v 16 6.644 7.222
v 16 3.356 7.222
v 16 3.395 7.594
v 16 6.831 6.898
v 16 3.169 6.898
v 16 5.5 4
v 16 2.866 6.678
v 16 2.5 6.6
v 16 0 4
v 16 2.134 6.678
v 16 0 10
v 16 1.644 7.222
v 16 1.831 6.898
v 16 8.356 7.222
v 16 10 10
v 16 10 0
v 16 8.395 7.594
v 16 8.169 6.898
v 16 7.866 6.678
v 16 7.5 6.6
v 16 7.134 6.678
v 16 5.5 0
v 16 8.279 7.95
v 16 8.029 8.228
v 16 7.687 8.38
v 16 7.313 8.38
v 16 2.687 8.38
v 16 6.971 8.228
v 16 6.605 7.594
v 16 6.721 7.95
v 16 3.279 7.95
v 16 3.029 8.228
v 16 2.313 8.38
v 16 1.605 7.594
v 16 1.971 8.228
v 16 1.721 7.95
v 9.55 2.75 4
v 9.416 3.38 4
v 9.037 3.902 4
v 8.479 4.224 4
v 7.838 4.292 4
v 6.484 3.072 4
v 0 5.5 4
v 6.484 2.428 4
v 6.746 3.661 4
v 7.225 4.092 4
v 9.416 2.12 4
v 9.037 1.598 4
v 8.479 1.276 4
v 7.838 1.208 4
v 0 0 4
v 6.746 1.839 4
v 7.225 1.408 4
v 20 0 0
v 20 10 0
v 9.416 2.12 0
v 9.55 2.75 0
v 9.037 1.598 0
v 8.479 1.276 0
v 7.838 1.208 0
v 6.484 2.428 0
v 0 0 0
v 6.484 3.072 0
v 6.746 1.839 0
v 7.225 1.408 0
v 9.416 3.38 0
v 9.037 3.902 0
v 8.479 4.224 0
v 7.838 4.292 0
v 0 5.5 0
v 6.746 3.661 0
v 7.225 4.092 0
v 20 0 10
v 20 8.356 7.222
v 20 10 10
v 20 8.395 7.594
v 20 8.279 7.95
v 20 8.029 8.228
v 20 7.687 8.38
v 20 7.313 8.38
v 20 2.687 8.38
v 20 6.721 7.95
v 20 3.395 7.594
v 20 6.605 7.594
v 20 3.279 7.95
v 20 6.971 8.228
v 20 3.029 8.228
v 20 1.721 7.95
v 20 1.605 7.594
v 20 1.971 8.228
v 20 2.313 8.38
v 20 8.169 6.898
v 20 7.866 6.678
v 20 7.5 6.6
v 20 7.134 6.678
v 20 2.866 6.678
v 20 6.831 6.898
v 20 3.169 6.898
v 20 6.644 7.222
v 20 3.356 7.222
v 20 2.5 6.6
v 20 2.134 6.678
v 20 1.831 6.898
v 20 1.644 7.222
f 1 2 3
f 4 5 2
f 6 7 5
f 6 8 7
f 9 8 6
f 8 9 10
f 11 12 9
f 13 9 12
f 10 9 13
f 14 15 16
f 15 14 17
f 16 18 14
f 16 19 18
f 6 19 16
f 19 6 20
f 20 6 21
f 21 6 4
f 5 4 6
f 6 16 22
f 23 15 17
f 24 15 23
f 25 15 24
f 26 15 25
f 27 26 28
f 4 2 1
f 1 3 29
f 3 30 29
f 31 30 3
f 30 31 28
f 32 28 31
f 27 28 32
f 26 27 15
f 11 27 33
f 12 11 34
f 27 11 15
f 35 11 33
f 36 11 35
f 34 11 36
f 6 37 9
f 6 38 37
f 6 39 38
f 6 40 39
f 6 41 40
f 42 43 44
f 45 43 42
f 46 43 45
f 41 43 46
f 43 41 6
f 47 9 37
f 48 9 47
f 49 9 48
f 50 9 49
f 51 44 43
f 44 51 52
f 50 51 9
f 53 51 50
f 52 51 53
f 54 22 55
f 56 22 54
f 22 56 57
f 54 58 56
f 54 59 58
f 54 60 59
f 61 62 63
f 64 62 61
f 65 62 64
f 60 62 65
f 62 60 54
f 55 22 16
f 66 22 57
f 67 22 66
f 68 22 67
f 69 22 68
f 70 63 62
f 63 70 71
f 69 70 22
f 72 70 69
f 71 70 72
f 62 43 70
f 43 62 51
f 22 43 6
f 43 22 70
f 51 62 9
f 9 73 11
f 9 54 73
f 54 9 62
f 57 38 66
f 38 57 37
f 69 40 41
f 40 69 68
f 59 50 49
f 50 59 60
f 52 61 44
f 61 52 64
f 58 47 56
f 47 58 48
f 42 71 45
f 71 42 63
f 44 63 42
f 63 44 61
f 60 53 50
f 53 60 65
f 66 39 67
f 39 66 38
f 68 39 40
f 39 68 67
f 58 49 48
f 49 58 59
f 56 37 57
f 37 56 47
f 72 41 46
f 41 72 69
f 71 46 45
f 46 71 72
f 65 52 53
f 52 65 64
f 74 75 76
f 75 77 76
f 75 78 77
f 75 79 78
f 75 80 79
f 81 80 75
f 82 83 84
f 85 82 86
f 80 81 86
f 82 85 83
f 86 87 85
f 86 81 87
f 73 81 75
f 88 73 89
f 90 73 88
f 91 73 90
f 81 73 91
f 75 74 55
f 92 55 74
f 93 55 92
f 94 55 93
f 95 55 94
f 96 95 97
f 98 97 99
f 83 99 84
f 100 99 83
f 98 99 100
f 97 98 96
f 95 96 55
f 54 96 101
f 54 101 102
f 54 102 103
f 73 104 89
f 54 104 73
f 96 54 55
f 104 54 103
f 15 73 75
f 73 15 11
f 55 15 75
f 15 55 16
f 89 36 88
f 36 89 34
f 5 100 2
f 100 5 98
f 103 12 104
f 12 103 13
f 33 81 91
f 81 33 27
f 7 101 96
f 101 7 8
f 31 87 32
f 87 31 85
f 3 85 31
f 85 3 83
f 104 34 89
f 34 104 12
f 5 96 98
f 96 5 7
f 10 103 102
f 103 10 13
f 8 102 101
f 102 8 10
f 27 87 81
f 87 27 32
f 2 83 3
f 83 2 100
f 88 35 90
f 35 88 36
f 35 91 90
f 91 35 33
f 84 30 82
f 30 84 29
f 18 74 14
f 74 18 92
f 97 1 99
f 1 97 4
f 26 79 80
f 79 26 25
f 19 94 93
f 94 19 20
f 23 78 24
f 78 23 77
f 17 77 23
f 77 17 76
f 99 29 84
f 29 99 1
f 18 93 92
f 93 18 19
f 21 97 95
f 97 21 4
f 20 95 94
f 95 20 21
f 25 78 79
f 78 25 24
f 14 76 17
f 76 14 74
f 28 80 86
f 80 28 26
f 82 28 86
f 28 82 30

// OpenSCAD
WallThickness = 4;

BaseWidth = 16;
BaseDepth = 5.5;
BaseHoleDiameter = 3.1;

BaseToFlagDistance = 6+WallThickness;
BaseToFlagWidth = 10;

AdjustHoleInsideDiameter = 1.8;


difference() {
    cube(size=[BaseWidth, BaseDepth, WallThickness], center=false);
    translate([BaseWidth/2, BaseDepth/2, 0])
    cylinder(h=WallThickness, d=BaseHoleDiameter, center=false, $fn=15);
}

translate([BaseToFlagDistance+WallThickness/2*3, 0, 0])
difference() {
    cube(size=[WallThickness, BaseToFlagWidth, BaseToFlagDistance], center=false);
    translate([0, BaseToFlagWidth/4, BaseToFlagDistance/4*3])
    rotate([0, 90, 0])
    cylinder(h=WallThickness, d=AdjustHoleInsideDiameter, center=false, $fn=15);
    translate([0, BaseToFlagWidth/4*3, BaseToFlagDistance/4*3])
    rotate([0, 90, 0])
    cylinder(h=WallThickness, d=AdjustHoleInsideDiameter, center=false, $fn=15);
}


/*
WallThickness = 1.5;
BaseHeight = 123+WallThickness*2;
BaseWidth = 101+WallThickness*2;
BaseDepth = 30;
CornerRadius = 3;

LCDWidth = 80.5;
LCDHeight = 50.5;
LCDTopOffset = 9+WallThickness;
LCDLeftOffset = 9+WallThickness;

ResetButtonDiameter = 6;
ResetButtonBottomOffet = 8.5+WallThickness;
ResetButtonLeftOffet = 70.5+WallThickness;

RotaryEncoderDiameter = 8;
RotaryEncoderBottomOffet = 19+WallThickness;
RotaryEncoderLeftOffet = 87.5+WallThickness;

CardButtonDiameter = 6;
CardButtonBottomOffet = 44.5+WallThickness;
CardButtonLeftOffet = 78.5+WallThickness;

TFCardHeight = 2;
TFCardWidth = 14;
TFCardBottomOffset = 15+WallThickness;
TFCardFrontOffset = 19+WallThickness;

MountingHoleDiameter = 5.5;

module RoundedRectangle($Width=BaseWidth, $Depth=BaseDepth, $Radius=CornerRadius) 
{
    polygon(points = [[$Radius, 0], [$Width-$Radius, 0],[$Width, $Radius], [$Width, $Depth-$Radius], [$Width-$Radius, $Depth], [$Radius, $Depth], [0, $Depth-$Radius], [0, $Radius]], paths=[[0,1,2,3,4,5,6,7]]);
        
    translate([$Radius,$Radius,0]){
        circle(r=$Radius);
    }        
    translate([$Width-$Radius,$Radius,0]){
        circle(r=$Radius);
    }
    
    translate([$Width-$Radius,$Depth-$Radius,0]){ 
        circle(r=$Radius);
    }
   
    translate([$Radius,$Depth-$Radius,0]){ 
        circle(r=$Radius);
    }
}

module base3D($Width=BaseWidth, $Depth=BaseDepth, $Height=BaseHeight, $Radius=CornerRadius, $Thickness=WallThickness)
{
    difference()
    {
        linear_extrude(height = $Height, center = false, convexity = 0, twist = 0)
        RoundedRectangle($Width, $Depth, $Radius);
        translate([$Thickness, $Thickness, $Thickness]) {
        linear_extrude(height = $Height, center = false, convexity = 0, twist = 0)
        RoundedRectangle($Width-$Thickness*2, $Depth-$Thickness*2, $Radius);
        }
    }
}


difference()
{
    base3D(BaseWidth, BaseDepth, BaseHeight, CornerRadius, WallThickness);
    // Make back open
    translate([0, BaseDepth-WallThickness*2, 10])
        cube(size=[BaseWidth, BaseDepth, BaseHeight], center=false);

    translate([0, BaseDepth-WallThickness*2, 110])
    rotate([45, 0, 0])
        cube(size=[BaseWidth, BaseDepth, BaseHeight], center=false);

    translate([0, BaseDepth-WallThickness*2+3, 30])
    rotate([7, 0, 0])
        cube(size=[BaseWidth, BaseDepth, BaseHeight], center=false);
    
    // LCD window
    translate([LCDLeftOffset, WallThickness, BaseHeight-LCDHeight-LCDTopOffset])
    rotate([90, 0, 0])
        cube(size=[LCDWidth, LCDHeight, WallThickness], center=false);
    // Reset button
    translate([ResetButtonLeftOffet, WallThickness, ResetButtonBottomOffet])
    rotate([90, 0, 0])
        cylinder(h=WallThickness, d=ResetButtonDiameter, center=false, $fn=30);
    // Rotary Encoder
    translate([RotaryEncoderLeftOffet, WallThickness, RotaryEncoderBottomOffet])
    rotate([90, 0, 0])
        cylinder(h=WallThickness, d=RotaryEncoderDiameter, center=false, $fn=30);
    // Card-In Button
    translate([CardButtonLeftOffet, WallThickness, CardButtonBottomOffet])
    rotate([90, 0, 0])
        cylinder(h=WallThickness, d=CardButtonDiameter, center=false, $fn=30);
    // TF Card on the side
    translate([WallThickness,TFCardFrontOffset,TFCardBottomOffset])
    rotate([0, -90, 0])
        cube(size=[TFCardWidth, TFCardHeight, WallThickness], center=false);
    // Mouting holes for 2020
    translate([BaseWidth-WallThickness-MountingHoleDiameter, BaseDepth-WallThickness-MountingHoleDiameter])
        cylinder(h=WallThickness, d=MountingHoleDiameter, center=false, $fn=30);
    translate([BaseWidth/4*2, BaseDepth-WallThickness-MountingHoleDiameter])
        cylinder(h=WallThickness, d=MountingHoleDiameter, center=false, $fn=30);
    translate([WallThickness+MountingHoleDiameter, BaseDepth-WallThickness-MountingHoleDiameter])
        cylinder(h=WallThickness, d=MountingHoleDiameter, center=false, $fn=30);

    translate([BaseWidth-WallThickness-MountingHoleDiameter, WallThickness+MountingHoleDiameter])
        cylinder(h=WallThickness, d=MountingHoleDiameter, center=false, $fn=30);
    translate([BaseWidth/4*2, WallThickness+MountingHoleDiameter])
        cylinder(h=WallThickness, d=MountingHoleDiameter, center=false, $fn=30);
    translate([WallThickness+MountingHoleDiameter, WallThickness+MountingHoleDiameter])
        cylinder(h=WallThickness, d=MountingHoleDiameter, center=false, $fn=30);

}

    translate([64, 0, 52])
    rotate([90, 0, 0])
    linear_extrude(height = WallThickness/2){
        text("CARD IN", size=5, font="Arial Black");
    }

    translate([10, 0, 50])
    rotate([90, 0, 0])
    linear_extrude(height = WallThickness/2){
        text("DIY 12864", size=6, font="Arial Black");
    }

    translate([6, 0, 35])
    rotate([90, 0, 0])
    linear_extrude(height = WallThickness/2){
        text("IBE Group, Inc.", size=6, font="Arial Black");
    }
    translate([5, 0, 20])
    rotate([90, 0, 0])
    linear_extrude(height = WallThickness/2){
        text("Copyright© 2019", size=6, font="Arial Black");
    }

    translate([41.5, 0, 7.5])
    rotate([90, 0, 0])
    linear_extrude(height = WallThickness/2){
        text("RESET", size=5, font="Arial Black");
    }
*/
